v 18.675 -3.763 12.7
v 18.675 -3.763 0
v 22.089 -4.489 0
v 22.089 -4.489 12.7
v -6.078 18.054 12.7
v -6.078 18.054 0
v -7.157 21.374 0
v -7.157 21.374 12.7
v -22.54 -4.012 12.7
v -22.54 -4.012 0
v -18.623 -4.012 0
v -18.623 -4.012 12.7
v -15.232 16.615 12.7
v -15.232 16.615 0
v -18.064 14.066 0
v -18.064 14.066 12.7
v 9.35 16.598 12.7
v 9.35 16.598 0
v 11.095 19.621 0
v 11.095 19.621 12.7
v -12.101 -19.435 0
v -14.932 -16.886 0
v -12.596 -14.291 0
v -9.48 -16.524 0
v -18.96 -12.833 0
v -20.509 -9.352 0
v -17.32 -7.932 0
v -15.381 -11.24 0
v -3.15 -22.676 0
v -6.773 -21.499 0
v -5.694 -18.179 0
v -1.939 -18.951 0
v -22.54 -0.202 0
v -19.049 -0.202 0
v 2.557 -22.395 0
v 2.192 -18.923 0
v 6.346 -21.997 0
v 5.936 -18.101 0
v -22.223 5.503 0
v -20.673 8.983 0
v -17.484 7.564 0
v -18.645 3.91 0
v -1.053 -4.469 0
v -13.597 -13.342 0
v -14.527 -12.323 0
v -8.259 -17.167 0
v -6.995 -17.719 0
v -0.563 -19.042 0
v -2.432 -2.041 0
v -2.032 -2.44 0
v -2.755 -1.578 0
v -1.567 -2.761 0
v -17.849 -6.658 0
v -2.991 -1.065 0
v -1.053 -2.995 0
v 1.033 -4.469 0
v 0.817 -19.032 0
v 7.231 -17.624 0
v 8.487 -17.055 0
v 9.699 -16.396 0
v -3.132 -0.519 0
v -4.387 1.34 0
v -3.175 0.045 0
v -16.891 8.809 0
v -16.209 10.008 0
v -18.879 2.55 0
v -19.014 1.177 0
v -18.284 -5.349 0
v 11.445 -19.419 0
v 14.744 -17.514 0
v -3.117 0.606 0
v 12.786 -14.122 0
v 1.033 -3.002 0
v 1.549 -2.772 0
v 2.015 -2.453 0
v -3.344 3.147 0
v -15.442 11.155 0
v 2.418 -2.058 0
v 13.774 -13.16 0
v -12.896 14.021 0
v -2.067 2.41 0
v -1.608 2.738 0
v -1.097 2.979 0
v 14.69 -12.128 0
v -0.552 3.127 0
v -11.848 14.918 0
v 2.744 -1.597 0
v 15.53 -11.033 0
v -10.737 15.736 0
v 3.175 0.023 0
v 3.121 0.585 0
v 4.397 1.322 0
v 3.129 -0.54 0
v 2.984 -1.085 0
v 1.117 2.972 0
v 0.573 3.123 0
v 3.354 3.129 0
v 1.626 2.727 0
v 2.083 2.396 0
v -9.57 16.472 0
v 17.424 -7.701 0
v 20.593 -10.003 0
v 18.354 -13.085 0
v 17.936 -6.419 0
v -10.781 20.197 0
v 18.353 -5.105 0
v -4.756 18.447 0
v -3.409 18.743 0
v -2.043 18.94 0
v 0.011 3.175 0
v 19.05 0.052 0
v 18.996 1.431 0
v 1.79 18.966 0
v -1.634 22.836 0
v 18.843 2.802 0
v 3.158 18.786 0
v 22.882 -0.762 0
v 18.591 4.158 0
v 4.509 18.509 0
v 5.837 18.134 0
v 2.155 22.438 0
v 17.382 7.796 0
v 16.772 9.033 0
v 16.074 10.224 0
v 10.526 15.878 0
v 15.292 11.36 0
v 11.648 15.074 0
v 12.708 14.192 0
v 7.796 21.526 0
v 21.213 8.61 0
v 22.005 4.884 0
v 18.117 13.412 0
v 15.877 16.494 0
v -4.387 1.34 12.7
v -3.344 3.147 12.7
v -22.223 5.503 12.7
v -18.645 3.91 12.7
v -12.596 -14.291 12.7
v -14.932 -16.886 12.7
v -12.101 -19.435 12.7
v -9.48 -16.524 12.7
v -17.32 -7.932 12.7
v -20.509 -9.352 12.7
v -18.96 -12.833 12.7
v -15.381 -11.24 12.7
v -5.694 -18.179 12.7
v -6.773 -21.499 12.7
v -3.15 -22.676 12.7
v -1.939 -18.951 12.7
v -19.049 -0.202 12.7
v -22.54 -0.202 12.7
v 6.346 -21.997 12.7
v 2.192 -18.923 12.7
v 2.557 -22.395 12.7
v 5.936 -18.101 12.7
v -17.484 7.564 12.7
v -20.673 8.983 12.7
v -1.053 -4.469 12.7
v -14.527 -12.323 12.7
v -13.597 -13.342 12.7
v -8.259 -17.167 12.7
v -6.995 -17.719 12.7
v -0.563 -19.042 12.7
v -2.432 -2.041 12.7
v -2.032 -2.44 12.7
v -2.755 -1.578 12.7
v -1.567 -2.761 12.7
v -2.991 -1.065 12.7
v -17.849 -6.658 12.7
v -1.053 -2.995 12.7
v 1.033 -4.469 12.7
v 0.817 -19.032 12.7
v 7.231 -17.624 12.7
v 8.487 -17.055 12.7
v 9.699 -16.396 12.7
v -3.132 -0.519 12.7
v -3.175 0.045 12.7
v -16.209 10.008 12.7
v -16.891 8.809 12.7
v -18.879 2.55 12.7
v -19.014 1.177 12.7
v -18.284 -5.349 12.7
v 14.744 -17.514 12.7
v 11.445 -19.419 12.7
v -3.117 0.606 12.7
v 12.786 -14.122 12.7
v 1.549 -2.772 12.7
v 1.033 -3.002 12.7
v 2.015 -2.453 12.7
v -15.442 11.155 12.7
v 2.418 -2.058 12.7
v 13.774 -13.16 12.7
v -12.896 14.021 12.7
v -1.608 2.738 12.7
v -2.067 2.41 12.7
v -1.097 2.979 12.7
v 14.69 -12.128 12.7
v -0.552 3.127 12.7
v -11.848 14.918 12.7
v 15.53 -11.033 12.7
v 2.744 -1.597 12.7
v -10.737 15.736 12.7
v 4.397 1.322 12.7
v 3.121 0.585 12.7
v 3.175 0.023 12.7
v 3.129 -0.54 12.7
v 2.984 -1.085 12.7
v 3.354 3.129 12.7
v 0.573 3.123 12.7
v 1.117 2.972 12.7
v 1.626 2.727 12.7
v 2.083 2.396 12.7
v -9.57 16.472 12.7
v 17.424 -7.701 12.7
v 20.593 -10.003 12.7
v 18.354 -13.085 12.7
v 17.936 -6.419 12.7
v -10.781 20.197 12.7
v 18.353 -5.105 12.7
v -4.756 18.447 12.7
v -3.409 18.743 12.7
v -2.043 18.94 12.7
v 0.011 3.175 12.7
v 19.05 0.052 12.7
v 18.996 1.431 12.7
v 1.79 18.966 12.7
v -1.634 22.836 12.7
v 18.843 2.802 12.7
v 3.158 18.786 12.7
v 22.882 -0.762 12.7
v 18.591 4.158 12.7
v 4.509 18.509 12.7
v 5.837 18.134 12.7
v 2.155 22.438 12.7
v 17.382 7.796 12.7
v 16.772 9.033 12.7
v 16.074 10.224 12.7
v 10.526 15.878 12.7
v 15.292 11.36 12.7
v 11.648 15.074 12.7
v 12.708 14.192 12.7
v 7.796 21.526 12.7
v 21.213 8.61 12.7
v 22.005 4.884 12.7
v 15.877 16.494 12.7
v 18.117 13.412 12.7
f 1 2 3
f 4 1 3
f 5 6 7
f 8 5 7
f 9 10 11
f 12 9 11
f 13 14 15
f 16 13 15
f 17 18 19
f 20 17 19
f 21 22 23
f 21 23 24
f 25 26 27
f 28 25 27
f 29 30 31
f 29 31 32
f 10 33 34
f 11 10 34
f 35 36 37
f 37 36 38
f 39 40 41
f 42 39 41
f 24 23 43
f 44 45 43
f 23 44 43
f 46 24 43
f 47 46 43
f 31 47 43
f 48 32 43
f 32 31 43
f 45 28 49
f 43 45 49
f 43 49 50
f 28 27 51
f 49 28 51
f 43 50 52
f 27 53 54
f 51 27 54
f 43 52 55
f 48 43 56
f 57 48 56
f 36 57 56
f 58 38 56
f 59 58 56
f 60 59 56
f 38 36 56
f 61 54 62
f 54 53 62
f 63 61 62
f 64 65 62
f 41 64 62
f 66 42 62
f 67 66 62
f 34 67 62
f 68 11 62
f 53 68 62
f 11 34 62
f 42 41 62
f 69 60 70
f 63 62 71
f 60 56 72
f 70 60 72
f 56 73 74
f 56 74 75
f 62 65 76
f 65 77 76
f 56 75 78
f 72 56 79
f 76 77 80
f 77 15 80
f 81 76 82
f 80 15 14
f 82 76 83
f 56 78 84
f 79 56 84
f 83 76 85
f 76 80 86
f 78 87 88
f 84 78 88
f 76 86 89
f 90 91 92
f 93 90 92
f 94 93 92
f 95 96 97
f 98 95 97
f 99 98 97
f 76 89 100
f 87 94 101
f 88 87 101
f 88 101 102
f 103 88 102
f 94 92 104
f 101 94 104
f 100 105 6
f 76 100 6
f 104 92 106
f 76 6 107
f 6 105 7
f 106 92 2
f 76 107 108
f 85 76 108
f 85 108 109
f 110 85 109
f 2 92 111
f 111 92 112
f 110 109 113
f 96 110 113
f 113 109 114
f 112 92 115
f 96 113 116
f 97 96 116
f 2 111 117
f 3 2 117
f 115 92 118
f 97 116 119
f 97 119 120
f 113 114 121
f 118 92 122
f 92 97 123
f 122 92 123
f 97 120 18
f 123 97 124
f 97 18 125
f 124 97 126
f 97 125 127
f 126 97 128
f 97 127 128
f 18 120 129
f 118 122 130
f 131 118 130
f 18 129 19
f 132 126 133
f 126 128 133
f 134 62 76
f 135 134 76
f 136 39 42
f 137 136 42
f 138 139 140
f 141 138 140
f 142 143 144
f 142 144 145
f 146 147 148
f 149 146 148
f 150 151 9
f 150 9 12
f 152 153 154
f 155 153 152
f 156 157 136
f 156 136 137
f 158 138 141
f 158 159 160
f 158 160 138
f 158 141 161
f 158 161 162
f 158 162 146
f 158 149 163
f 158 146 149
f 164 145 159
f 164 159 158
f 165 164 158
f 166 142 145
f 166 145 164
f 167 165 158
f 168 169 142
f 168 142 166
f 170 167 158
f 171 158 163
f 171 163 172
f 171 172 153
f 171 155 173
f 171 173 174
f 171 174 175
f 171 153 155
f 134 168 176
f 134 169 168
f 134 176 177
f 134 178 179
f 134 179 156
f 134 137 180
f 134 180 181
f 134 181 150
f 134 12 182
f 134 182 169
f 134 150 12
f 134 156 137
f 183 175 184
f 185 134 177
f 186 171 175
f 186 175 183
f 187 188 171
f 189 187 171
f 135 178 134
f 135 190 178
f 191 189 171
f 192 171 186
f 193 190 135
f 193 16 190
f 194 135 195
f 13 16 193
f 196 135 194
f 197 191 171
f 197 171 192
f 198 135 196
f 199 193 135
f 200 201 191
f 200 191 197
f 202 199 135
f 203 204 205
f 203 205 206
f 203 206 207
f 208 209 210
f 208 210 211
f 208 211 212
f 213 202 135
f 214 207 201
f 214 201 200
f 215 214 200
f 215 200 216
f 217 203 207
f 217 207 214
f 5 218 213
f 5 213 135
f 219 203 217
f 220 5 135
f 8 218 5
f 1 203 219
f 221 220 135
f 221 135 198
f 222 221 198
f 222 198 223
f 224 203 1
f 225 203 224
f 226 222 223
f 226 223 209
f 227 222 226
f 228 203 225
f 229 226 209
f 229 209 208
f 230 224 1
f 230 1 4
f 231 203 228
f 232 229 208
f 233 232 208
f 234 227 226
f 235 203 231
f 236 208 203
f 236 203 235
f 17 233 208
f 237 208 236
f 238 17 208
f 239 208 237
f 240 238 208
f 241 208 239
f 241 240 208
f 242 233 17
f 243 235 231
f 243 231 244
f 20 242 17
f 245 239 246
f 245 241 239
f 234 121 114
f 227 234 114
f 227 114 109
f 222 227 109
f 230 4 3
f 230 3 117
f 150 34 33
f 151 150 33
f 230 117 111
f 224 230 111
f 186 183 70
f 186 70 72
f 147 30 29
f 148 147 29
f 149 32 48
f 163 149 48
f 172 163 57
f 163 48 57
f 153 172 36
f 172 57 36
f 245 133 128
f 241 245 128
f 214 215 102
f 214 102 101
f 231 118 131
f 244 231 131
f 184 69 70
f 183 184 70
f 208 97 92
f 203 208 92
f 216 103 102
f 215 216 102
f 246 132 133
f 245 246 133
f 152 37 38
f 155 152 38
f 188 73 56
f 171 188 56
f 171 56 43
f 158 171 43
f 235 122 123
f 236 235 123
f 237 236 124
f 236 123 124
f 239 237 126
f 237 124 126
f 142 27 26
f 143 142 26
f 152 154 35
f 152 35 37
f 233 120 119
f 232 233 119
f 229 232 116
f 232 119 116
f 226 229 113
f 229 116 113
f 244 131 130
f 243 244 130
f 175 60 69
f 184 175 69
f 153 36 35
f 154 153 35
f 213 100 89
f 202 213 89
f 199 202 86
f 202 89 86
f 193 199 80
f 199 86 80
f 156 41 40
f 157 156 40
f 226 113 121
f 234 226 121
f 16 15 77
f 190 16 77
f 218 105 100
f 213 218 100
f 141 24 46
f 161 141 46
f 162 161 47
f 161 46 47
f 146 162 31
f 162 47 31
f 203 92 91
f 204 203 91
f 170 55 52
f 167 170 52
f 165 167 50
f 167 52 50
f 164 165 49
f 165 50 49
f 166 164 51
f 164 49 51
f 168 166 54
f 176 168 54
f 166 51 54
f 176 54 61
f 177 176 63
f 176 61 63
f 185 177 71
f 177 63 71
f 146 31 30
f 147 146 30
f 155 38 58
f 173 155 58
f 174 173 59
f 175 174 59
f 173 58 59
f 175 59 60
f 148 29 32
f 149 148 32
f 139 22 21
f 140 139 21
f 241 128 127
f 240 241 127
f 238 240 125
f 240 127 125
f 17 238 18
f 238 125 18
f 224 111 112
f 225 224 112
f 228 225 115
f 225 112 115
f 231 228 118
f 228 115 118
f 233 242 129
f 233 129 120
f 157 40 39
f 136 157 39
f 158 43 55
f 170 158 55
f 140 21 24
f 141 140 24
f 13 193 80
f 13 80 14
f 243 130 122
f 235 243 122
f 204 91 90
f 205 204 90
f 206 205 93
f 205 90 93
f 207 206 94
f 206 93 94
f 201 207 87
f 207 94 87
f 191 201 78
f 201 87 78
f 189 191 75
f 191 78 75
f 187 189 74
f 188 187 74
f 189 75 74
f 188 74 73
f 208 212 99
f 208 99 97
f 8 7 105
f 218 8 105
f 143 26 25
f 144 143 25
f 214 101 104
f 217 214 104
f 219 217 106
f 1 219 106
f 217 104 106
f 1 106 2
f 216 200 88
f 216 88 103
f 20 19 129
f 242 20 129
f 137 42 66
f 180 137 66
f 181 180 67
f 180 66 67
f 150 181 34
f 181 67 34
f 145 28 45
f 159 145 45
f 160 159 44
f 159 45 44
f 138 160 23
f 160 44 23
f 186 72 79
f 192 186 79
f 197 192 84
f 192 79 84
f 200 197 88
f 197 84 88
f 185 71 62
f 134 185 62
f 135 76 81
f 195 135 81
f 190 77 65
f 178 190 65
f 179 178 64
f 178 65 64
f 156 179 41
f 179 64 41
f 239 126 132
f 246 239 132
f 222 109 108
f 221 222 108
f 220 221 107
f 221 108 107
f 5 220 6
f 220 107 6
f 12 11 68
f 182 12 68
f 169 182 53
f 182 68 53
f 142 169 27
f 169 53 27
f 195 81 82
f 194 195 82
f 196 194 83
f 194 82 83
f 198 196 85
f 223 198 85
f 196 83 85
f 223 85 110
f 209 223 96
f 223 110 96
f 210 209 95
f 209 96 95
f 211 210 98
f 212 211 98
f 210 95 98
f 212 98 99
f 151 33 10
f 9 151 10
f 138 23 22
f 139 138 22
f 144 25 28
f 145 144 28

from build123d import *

# Parameters (mm, degrees)
EXTRUSION3_DEPTH = 12.7


with BuildPart() as part:
    # Sketch1 → Extrusion3 (new body)
    with BuildSketch(Plane.XY):
        with BuildLine():
            Line((21.213296498, 8.610485701), (17.381714073, 7.796057715))
            ThreePointArc((17.381714073, 7.796057715), (16.433889851, 9.634820412), (15.292273906, 11.359967376))
            Line((15.292273906, 11.359967376), (18.116572419, 13.411940358))
            Line((18.116572419, 13.411940358), (15.877110608, 16.494295106))
            Line((15.877110608, 16.494295106), (12.708043593, 14.191833146))
            ThreePointArc((12.708043593, 14.191833146), (11.094270913, 15.486111613), (9.349672368, 16.597774749))
            Line((9.349672368, 16.597774749), (11.095184843, 19.621091042))
            Line((11.095184843, 19.621091042), (7.795628055, 21.526091042))
            Line((7.795628055, 21.526091042), (5.837036927, 18.133711697))
            ThreePointArc((5.837036927, 18.133711697), (-11.299849109, 15.336750311), (-19.048930763, -0.201833587))
            Line((-19.048930763, -0.201833587), (-22.539955714, -0.201833587))
            Line((-22.539955714, -0.201833587), (-22.539955714, -4.011833587))
            Line((-22.539955714, -4.011833587), (-18.622773458, -4.011833587))
            ThreePointArc((-18.622773458, -4.011833587), (-18.077961731, -6.007478644), (-17.319971056, -7.932282309))
            Line((-17.319971056, -7.932282309), (-20.509181042, -9.352210079))
            Line((-20.509181042, -9.352210079), (-18.959514432, -12.832818272))
            Line((-18.959514432, -12.832818272), (-15.380990376, -11.239556711))
            ThreePointArc((-15.380990376, -11.239556711), (-14.071578126, -12.841074295), (-12.596231006, -14.291167358))
            Line((-12.596231006, -14.291167358), (-14.932182648, -16.885504485))
            Line((-14.932182648, -16.885504485), (-12.100800863, -19.434892096))
            Line((-12.100800863, -19.434892096), (-9.479694325, -16.523858372))
            ThreePointArc((-9.479694325, -16.523858372), (-7.632090826, -17.454331543), (-5.694488182, -18.178979739))
            Line((-5.694488182, -18.178979739), (-6.77327422, -21.499141767))
            Line((-6.77327422, -21.499141767), (-3.149748893, -22.676496515))
            Line((-3.149748893, -22.676496515), (-1.939273006, -18.951034806))
            ThreePointArc((-1.939273006, -18.951034806), (0.127054312, -19.0495763), (2.191883381, -18.923481372))
            Line((2.191883381, -18.923481372), (2.556794854, -22.395382123))
            Line((2.556794854, -22.395382123), (6.345923276, -21.997128678))
            Line((6.345923276, -21.997128678), (5.936466234, -18.101405157))
            ThreePointArc((5.936466234, -18.101405157), (7.864230606, -17.350976254), (9.699258395, -16.395941162))
            Line((9.699258395, -16.395941162), (11.44477087, -19.419257455))
            Line((11.44477087, -19.419257455), (14.744327659, -17.514257455))
            Line((14.744327659, -17.514257455), (12.785736531, -14.12187811))
            ThreePointArc((12.785736531, -14.12187811), (14.241609984, -12.652234785), (15.529543518, -11.033393772))
            Line((15.529543518, -11.033393772), (18.353842031, -13.085366754))
            Line((18.353842031, -13.085366754), (20.593303842, -10.003012005))
            Line((20.593303842, -10.003012005), (17.424236827, -7.700550045))
            ThreePointArc((17.424236827, -7.700550045), (18.156485614, -5.76580698), (18.674629484, -3.763072364))
            Line((18.674629484, -3.763072364), (22.089367164, -4.488897265))
            Line((22.089367164, -4.488897265), (22.881510706, -0.762154906))
            Line((22.881510706, -0.762154906), (19.049928281, 0.05227308))
            ThreePointArc((19.049928281, 0.05227308), (18.931939936, 2.117581232), (18.59070236, 4.157918442))
            Line((18.59070236, 4.157918442), (22.00544004, 4.883743342))
            Line((22.00544004, 4.883743342), (21.213296498, 8.610485701))
        make_face()
        with BuildLine():
            Line((-3.343536182, 3.146775418), (-2.067167627, 2.409863689))
            ThreePointArc((-2.067167627, 2.409863689), (0.010648283, 3.174982144), (2.083285387, 2.395943863))
            Line((2.083285387, 2.395943863), (3.353593084, 3.129356353))
            Line((3.353593084, 3.129356353), (4.396955543, 1.322199563))
            Line((4.396955543, 1.322199563), (3.120586988, 0.585287835))
            ThreePointArc((3.120586988, 0.585287835), (2.744291052, -1.596712756), (1.033305558, -3.00215))
            Line((1.033305558, -3.00215), (1.033305558, -4.468974981))
            Line((1.033305558, -4.468974981), (-1.053419361, -4.468974981))
            Line((-1.053419361, -4.468974981), (-1.053419361, -2.995151524))
            ThreePointArc((-1.053419361, -2.995151524), (-2.754939335, -1.578269388), (-3.116590945, 0.606206137))
            Line((-3.116590945, 0.606206137), (-4.386898641, 1.339618628))
            Line((-4.386898641, 1.339618628), (-3.343536182, 3.146775418))
        make_face(mode=Mode.SUBTRACT)
        with BuildLine():
            Line((-1.63378941, 22.835830278), (-2.043246451, 18.940106756))
            ThreePointArc((-2.043246451, 18.940106756), (-0.127054312, 19.0495763), (1.790427538, 18.965676082))
            Line((1.790427538, 18.965676082), (2.155339011, 22.437576832))
            Line((2.155339011, 22.437576832), (-1.63378941, 22.835830278))
        make_face()
        with BuildLine():
            Line((-10.780709843, 20.197047001), (-9.570233956, 16.471585292))
            ThreePointArc((-9.570233956, 16.471585292), (-7.864230606, 17.350976254), (-6.078398478, 18.054239722))
            Line((-6.078398478, 18.054239722), (-7.157184516, 21.37440175))
            Line((-7.157184516, 21.37440175), (-10.780709843, 20.197047001))
        make_face()
        with BuildLine():
            Line((-18.063547605, 14.066010814), (-15.442441067, 11.154977091))
            ThreePointArc((-15.442441067, 11.154977091), (-14.241609984, 12.652234785), (-12.896214177, 14.021061297))
            Line((-12.896214177, 14.021061297), (-15.23216582, 16.615398425))
            Line((-15.23216582, 16.615398425), (-18.063547605, 14.066010814))
        make_face()
        with BuildLine():
            Line((-22.223033883, 5.502833572), (-18.644509827, 3.909572011))
            ThreePointArc((-18.644509827, 3.909572011), (-18.156485614, 5.76580698), (-17.484157287, 7.563513996))
            Line((-17.484157287, 7.563513996), (-20.673367273, 8.983441766))
            Line((-20.673367273, 8.983441766), (-22.223033883, 5.502833572))
        make_face()
    extrude(amount=EXTRUSION3_DEPTH)


solid = part.part
